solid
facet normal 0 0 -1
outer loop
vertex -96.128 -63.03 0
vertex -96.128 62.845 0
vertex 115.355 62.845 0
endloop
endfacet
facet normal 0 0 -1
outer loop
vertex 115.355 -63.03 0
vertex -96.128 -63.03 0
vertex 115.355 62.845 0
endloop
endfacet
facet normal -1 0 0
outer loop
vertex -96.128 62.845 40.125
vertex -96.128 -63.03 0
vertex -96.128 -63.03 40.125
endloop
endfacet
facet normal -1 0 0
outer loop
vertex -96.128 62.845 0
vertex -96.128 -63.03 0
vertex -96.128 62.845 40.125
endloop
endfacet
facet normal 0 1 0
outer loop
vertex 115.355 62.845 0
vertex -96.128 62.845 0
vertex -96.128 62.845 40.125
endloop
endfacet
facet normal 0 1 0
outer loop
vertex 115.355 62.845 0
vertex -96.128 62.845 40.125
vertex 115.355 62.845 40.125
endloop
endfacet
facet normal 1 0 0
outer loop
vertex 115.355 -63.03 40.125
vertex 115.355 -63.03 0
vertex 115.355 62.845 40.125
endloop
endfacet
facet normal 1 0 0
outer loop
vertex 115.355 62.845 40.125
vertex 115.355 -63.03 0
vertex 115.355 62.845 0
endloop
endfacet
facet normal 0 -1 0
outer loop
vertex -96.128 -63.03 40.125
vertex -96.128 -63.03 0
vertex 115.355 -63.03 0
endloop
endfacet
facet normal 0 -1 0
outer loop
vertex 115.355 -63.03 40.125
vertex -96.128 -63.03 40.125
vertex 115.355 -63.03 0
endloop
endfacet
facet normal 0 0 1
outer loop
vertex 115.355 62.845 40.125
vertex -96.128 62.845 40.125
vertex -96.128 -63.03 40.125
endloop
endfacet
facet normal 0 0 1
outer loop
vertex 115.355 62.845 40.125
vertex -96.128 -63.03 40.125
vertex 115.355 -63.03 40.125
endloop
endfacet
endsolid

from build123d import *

# Parameters (mm, degrees)
F3_DEPTH = 20.32
F4_DEPTH = 30.48
F0_W     = 211.483144
F0_H     = 125.875018
F5_DEPTH = 40.12469


with BuildPart() as f3:
    # F1 (on Top) → F3 (new body)
    with BuildSketch(Plane.XY):
        Polygon((0, 45.720275), (-4.140248, 45.720275), (-4.144755, -45.720518), (0, -45.720518), (0, -38.86215), (66.039294, -38.86215), (66.039294, 38.862053), (0, 38.862053), align=None)
    extrude(amount=F3_DEPTH)

    # F2 (on Top) → F4 (join)
    with BuildSketch(Plane.XY):
        Polygon((-21.086555, -45.719682), (-4.144755, -45.720518), (-4.140248, 45.720275), (-21.082048, 45.720275), (-21.082048, 55.880275), (-46.482048, 55.880275), (-46.482548, 45.720276), (-66.040048, 45.72124), (-66.044555, -45.717466), (-46.486555, -45.71843), (-46.487056, -55.87843), (-21.087056, -55.879682), align=None)
    extrude(amount=F4_DEPTH)

    # F0 (on Top) → F5 (join)
    with BuildSketch(Plane.XY):
        with Locations((9.613108, -0.092279)):
            Rectangle(F0_W, F0_H)
    extrude(amount=F5_DEPTH)


solid = f3.part
